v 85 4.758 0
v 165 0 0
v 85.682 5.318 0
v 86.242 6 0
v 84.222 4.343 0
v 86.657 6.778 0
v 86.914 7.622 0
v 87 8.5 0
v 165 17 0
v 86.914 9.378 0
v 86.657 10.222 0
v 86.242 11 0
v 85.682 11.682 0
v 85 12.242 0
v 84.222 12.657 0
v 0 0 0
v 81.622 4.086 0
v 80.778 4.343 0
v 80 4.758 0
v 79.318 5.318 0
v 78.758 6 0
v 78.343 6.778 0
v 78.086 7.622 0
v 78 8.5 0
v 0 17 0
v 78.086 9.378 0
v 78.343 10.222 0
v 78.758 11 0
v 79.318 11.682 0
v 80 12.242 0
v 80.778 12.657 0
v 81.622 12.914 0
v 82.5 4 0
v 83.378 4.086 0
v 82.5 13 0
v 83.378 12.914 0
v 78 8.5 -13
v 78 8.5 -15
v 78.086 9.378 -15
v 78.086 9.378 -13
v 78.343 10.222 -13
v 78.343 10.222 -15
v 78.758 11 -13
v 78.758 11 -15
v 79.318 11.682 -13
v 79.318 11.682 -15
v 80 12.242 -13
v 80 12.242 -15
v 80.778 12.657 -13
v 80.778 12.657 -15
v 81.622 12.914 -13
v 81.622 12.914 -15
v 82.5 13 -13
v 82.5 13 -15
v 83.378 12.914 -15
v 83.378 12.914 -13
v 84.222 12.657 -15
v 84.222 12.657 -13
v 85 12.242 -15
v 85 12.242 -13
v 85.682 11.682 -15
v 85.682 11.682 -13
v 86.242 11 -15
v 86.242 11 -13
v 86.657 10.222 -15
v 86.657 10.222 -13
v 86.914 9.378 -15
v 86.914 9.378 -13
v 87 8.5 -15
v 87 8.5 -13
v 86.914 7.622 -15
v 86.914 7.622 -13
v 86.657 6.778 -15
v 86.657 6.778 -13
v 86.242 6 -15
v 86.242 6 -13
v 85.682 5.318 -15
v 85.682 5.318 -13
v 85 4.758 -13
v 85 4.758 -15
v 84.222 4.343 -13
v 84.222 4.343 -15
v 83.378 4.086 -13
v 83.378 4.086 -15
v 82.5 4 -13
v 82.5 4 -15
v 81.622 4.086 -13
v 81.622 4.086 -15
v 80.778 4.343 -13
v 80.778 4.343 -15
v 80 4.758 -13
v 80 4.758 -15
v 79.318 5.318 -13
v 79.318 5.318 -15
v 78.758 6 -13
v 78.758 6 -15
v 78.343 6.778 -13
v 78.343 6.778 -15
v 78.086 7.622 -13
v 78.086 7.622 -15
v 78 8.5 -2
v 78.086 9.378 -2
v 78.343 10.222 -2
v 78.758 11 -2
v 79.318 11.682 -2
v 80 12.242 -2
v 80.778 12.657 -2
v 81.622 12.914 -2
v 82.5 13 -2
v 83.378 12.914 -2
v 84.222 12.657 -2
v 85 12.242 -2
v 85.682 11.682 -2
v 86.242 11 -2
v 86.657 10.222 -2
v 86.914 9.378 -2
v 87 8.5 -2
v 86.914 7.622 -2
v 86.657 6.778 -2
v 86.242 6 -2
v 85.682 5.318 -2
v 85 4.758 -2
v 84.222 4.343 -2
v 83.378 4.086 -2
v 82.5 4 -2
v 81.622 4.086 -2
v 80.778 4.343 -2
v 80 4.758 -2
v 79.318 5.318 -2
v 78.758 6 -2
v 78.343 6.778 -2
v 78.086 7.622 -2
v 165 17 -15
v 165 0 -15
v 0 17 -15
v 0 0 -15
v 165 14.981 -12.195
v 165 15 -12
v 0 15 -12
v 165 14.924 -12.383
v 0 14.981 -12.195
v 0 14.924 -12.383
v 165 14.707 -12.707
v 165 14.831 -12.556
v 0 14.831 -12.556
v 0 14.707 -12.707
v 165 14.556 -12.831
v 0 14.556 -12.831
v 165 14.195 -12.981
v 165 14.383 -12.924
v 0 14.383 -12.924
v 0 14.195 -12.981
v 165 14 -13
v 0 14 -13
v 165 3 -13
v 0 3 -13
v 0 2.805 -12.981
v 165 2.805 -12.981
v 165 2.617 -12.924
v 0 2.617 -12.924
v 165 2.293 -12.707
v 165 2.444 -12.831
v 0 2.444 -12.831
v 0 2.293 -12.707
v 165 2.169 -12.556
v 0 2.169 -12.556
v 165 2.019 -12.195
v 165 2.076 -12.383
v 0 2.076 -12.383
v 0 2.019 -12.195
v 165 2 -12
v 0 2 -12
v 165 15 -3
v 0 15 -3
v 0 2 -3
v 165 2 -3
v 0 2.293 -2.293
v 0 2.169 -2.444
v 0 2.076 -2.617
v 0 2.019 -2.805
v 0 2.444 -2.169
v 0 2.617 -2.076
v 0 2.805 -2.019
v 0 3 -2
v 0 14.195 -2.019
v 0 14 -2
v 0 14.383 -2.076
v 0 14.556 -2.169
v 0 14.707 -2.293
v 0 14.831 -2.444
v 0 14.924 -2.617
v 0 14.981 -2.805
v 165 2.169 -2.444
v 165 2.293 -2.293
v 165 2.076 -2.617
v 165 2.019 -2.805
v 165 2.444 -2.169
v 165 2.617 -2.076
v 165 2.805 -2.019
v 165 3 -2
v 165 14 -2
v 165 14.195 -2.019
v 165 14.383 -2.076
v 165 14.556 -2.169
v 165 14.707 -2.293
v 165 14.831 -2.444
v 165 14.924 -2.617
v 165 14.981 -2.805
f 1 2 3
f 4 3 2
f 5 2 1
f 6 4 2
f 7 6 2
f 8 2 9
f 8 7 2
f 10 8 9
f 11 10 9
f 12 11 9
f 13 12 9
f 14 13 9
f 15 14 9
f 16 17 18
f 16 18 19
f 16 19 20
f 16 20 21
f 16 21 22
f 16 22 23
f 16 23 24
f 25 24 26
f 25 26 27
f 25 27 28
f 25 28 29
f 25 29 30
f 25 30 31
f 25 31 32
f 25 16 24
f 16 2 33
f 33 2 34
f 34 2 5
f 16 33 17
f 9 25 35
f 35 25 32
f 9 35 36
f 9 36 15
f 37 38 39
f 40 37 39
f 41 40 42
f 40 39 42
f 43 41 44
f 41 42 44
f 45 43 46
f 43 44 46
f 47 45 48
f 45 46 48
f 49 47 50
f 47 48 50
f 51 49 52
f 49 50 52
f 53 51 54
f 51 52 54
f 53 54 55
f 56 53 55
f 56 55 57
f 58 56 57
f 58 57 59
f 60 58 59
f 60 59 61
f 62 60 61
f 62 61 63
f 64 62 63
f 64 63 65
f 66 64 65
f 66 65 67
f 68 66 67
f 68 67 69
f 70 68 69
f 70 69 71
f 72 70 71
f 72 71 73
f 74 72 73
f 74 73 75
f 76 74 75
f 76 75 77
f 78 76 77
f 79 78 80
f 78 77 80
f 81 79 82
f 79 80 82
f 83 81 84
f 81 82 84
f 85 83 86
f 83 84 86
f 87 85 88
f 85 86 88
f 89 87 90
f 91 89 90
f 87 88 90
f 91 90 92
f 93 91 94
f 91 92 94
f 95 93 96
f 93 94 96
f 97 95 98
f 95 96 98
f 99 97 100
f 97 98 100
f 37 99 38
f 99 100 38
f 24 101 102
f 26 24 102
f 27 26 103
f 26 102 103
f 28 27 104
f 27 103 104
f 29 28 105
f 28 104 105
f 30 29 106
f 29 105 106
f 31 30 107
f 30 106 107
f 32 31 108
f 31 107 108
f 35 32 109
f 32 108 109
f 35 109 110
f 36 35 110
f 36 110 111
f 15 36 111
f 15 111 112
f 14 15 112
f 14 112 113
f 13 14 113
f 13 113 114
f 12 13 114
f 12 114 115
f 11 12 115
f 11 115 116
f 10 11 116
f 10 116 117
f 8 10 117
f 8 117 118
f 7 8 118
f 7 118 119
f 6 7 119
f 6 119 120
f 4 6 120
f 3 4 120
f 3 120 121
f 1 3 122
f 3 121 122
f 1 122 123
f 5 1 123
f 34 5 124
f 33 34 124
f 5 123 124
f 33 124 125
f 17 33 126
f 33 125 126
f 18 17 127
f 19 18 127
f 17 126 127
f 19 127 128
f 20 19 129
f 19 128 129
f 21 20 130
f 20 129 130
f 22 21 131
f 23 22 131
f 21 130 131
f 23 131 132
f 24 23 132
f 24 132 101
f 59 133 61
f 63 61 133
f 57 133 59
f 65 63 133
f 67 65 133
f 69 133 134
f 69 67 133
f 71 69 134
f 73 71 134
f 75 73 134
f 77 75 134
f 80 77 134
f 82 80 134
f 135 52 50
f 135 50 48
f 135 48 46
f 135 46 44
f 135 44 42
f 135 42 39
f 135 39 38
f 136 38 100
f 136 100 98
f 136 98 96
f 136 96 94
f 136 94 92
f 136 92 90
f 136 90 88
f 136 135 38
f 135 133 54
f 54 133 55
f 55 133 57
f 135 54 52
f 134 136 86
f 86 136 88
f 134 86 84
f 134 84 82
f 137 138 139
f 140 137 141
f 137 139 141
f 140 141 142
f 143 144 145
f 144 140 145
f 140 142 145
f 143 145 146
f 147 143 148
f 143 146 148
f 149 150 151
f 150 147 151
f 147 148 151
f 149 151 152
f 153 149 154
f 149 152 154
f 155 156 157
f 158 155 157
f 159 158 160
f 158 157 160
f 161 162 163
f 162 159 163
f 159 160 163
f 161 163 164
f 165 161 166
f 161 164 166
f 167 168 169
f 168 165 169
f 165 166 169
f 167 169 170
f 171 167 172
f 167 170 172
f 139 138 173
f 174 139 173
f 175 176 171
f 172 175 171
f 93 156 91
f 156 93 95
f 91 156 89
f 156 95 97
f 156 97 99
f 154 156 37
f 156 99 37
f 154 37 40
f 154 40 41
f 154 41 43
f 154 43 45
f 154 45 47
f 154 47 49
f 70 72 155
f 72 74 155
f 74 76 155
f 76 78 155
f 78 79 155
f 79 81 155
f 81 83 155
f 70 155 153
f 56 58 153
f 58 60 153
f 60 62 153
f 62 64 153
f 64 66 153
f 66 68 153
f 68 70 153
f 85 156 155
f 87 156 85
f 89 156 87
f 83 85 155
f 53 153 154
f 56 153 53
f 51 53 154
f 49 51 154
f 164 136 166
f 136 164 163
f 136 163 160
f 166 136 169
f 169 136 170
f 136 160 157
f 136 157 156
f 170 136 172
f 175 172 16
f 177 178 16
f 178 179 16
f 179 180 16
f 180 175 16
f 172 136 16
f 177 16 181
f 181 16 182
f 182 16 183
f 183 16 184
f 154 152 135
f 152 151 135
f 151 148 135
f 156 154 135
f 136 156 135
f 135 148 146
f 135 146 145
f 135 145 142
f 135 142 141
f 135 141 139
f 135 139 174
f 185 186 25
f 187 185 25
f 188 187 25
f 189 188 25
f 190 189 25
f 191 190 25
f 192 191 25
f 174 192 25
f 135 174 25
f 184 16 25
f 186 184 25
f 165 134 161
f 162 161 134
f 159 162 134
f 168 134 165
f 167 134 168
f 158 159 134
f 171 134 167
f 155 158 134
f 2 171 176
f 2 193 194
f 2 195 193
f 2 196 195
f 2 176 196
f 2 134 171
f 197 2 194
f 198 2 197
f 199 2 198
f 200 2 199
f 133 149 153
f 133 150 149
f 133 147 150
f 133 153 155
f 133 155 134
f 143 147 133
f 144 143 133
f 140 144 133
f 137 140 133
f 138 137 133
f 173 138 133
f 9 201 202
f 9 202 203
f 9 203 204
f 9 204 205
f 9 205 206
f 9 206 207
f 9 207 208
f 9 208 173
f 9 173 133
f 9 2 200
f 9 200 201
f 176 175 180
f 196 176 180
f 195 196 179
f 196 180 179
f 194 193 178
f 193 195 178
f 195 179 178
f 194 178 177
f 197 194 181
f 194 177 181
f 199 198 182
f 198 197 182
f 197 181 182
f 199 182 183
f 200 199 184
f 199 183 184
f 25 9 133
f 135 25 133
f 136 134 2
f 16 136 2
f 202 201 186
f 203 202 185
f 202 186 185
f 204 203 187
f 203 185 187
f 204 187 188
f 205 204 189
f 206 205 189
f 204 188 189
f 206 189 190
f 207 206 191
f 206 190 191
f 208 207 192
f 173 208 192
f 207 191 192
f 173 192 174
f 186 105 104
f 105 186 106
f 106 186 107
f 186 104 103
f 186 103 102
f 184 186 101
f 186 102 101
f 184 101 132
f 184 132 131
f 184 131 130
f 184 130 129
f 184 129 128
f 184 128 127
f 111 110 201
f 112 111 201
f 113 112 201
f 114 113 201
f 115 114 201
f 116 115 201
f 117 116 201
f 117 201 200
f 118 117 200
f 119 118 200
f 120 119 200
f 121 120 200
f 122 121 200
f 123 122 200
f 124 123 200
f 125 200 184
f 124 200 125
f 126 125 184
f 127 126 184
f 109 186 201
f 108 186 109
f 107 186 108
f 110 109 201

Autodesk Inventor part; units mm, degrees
ref_plane "YZ Plane" through (0, 0, 0) normal (1, 0, 0) x (0, 1, 0)
ref_plane "XZ Plane" through (0, 0, 0) normal (0, 1, 0) x (-1, 0, 0)
ref_plane "XY Plane" through (0, 0, 0) normal (0, 0, 1) x (1, 0, 0)
sketch "Sketch2" plane through (0, 0, 0) normal (1, 0, 0) x (0, 1, 0)
  line L0 (0, 0) -> (17, 0)
  line L1 (17, 0) -> (17, -15)
  line L2 (17, -15) -> (0, -15)
  line L3 (0, -15) -> (0, 0)
  dimension "d4" = 17
  dimension "d5" = 15
extrude "Extrusion2" add sketch "Sketch2" along normal blind 165
sketch "Sketch3" plane through (165, 0, 0) normal (1, 0, 0) x (0, 0, -1)
  line L0 (0, 17) -> (0, 0) projected
  line L1 (0, 0) -> (15, 0) projected
  line L2 (15, 0) -> (15, 17) projected
  line L3 (2, 2) -> (13, 2)
  line L4 (13, 2) -> (13, 15)
  line L5 (13, 15) -> (2, 15)
  line L6 (2, 15) -> (2, 2)
  line L7 (2, 2) -> (13, 15) construction
  line L8 (13, 2) -> (2, 15) construction
  point P0 (7.5, 8.5)
  dimension "d9" = 11
  dimension "d10" = 13
extrude "Extrusion3" cut sketch "Sketch3" against normal through all
sketch "Sketch5" plane through (0, 0, -15) normal (0, 0, -1) x (-1, 0, 0)
  line L0 (0, 0) -> (-165, 0) projected
  line L1 (-165, 0) -> (0, 17)
  line L2 (-165, 0) -> (-165, 17) projected
  line L3 (0, 0) -> (-165, 17)
  circle A0 centre (-82.5, 8.5) radius 4.5
  dimension "d13" = 9
extrude "Extrusion4" cut sketch "Sketch5" against normal through all contours A0 L1 L3 | L3 L1 A0 | A0 L3 L1 | L3 A0 L1
fillet "Fillet1" radius 1 4 edges at (82.5, 2, -13) (82.5, 2, -2) (82.5, 15, -2) (82.5, 15, -13)
properties part number "caja perfil"
